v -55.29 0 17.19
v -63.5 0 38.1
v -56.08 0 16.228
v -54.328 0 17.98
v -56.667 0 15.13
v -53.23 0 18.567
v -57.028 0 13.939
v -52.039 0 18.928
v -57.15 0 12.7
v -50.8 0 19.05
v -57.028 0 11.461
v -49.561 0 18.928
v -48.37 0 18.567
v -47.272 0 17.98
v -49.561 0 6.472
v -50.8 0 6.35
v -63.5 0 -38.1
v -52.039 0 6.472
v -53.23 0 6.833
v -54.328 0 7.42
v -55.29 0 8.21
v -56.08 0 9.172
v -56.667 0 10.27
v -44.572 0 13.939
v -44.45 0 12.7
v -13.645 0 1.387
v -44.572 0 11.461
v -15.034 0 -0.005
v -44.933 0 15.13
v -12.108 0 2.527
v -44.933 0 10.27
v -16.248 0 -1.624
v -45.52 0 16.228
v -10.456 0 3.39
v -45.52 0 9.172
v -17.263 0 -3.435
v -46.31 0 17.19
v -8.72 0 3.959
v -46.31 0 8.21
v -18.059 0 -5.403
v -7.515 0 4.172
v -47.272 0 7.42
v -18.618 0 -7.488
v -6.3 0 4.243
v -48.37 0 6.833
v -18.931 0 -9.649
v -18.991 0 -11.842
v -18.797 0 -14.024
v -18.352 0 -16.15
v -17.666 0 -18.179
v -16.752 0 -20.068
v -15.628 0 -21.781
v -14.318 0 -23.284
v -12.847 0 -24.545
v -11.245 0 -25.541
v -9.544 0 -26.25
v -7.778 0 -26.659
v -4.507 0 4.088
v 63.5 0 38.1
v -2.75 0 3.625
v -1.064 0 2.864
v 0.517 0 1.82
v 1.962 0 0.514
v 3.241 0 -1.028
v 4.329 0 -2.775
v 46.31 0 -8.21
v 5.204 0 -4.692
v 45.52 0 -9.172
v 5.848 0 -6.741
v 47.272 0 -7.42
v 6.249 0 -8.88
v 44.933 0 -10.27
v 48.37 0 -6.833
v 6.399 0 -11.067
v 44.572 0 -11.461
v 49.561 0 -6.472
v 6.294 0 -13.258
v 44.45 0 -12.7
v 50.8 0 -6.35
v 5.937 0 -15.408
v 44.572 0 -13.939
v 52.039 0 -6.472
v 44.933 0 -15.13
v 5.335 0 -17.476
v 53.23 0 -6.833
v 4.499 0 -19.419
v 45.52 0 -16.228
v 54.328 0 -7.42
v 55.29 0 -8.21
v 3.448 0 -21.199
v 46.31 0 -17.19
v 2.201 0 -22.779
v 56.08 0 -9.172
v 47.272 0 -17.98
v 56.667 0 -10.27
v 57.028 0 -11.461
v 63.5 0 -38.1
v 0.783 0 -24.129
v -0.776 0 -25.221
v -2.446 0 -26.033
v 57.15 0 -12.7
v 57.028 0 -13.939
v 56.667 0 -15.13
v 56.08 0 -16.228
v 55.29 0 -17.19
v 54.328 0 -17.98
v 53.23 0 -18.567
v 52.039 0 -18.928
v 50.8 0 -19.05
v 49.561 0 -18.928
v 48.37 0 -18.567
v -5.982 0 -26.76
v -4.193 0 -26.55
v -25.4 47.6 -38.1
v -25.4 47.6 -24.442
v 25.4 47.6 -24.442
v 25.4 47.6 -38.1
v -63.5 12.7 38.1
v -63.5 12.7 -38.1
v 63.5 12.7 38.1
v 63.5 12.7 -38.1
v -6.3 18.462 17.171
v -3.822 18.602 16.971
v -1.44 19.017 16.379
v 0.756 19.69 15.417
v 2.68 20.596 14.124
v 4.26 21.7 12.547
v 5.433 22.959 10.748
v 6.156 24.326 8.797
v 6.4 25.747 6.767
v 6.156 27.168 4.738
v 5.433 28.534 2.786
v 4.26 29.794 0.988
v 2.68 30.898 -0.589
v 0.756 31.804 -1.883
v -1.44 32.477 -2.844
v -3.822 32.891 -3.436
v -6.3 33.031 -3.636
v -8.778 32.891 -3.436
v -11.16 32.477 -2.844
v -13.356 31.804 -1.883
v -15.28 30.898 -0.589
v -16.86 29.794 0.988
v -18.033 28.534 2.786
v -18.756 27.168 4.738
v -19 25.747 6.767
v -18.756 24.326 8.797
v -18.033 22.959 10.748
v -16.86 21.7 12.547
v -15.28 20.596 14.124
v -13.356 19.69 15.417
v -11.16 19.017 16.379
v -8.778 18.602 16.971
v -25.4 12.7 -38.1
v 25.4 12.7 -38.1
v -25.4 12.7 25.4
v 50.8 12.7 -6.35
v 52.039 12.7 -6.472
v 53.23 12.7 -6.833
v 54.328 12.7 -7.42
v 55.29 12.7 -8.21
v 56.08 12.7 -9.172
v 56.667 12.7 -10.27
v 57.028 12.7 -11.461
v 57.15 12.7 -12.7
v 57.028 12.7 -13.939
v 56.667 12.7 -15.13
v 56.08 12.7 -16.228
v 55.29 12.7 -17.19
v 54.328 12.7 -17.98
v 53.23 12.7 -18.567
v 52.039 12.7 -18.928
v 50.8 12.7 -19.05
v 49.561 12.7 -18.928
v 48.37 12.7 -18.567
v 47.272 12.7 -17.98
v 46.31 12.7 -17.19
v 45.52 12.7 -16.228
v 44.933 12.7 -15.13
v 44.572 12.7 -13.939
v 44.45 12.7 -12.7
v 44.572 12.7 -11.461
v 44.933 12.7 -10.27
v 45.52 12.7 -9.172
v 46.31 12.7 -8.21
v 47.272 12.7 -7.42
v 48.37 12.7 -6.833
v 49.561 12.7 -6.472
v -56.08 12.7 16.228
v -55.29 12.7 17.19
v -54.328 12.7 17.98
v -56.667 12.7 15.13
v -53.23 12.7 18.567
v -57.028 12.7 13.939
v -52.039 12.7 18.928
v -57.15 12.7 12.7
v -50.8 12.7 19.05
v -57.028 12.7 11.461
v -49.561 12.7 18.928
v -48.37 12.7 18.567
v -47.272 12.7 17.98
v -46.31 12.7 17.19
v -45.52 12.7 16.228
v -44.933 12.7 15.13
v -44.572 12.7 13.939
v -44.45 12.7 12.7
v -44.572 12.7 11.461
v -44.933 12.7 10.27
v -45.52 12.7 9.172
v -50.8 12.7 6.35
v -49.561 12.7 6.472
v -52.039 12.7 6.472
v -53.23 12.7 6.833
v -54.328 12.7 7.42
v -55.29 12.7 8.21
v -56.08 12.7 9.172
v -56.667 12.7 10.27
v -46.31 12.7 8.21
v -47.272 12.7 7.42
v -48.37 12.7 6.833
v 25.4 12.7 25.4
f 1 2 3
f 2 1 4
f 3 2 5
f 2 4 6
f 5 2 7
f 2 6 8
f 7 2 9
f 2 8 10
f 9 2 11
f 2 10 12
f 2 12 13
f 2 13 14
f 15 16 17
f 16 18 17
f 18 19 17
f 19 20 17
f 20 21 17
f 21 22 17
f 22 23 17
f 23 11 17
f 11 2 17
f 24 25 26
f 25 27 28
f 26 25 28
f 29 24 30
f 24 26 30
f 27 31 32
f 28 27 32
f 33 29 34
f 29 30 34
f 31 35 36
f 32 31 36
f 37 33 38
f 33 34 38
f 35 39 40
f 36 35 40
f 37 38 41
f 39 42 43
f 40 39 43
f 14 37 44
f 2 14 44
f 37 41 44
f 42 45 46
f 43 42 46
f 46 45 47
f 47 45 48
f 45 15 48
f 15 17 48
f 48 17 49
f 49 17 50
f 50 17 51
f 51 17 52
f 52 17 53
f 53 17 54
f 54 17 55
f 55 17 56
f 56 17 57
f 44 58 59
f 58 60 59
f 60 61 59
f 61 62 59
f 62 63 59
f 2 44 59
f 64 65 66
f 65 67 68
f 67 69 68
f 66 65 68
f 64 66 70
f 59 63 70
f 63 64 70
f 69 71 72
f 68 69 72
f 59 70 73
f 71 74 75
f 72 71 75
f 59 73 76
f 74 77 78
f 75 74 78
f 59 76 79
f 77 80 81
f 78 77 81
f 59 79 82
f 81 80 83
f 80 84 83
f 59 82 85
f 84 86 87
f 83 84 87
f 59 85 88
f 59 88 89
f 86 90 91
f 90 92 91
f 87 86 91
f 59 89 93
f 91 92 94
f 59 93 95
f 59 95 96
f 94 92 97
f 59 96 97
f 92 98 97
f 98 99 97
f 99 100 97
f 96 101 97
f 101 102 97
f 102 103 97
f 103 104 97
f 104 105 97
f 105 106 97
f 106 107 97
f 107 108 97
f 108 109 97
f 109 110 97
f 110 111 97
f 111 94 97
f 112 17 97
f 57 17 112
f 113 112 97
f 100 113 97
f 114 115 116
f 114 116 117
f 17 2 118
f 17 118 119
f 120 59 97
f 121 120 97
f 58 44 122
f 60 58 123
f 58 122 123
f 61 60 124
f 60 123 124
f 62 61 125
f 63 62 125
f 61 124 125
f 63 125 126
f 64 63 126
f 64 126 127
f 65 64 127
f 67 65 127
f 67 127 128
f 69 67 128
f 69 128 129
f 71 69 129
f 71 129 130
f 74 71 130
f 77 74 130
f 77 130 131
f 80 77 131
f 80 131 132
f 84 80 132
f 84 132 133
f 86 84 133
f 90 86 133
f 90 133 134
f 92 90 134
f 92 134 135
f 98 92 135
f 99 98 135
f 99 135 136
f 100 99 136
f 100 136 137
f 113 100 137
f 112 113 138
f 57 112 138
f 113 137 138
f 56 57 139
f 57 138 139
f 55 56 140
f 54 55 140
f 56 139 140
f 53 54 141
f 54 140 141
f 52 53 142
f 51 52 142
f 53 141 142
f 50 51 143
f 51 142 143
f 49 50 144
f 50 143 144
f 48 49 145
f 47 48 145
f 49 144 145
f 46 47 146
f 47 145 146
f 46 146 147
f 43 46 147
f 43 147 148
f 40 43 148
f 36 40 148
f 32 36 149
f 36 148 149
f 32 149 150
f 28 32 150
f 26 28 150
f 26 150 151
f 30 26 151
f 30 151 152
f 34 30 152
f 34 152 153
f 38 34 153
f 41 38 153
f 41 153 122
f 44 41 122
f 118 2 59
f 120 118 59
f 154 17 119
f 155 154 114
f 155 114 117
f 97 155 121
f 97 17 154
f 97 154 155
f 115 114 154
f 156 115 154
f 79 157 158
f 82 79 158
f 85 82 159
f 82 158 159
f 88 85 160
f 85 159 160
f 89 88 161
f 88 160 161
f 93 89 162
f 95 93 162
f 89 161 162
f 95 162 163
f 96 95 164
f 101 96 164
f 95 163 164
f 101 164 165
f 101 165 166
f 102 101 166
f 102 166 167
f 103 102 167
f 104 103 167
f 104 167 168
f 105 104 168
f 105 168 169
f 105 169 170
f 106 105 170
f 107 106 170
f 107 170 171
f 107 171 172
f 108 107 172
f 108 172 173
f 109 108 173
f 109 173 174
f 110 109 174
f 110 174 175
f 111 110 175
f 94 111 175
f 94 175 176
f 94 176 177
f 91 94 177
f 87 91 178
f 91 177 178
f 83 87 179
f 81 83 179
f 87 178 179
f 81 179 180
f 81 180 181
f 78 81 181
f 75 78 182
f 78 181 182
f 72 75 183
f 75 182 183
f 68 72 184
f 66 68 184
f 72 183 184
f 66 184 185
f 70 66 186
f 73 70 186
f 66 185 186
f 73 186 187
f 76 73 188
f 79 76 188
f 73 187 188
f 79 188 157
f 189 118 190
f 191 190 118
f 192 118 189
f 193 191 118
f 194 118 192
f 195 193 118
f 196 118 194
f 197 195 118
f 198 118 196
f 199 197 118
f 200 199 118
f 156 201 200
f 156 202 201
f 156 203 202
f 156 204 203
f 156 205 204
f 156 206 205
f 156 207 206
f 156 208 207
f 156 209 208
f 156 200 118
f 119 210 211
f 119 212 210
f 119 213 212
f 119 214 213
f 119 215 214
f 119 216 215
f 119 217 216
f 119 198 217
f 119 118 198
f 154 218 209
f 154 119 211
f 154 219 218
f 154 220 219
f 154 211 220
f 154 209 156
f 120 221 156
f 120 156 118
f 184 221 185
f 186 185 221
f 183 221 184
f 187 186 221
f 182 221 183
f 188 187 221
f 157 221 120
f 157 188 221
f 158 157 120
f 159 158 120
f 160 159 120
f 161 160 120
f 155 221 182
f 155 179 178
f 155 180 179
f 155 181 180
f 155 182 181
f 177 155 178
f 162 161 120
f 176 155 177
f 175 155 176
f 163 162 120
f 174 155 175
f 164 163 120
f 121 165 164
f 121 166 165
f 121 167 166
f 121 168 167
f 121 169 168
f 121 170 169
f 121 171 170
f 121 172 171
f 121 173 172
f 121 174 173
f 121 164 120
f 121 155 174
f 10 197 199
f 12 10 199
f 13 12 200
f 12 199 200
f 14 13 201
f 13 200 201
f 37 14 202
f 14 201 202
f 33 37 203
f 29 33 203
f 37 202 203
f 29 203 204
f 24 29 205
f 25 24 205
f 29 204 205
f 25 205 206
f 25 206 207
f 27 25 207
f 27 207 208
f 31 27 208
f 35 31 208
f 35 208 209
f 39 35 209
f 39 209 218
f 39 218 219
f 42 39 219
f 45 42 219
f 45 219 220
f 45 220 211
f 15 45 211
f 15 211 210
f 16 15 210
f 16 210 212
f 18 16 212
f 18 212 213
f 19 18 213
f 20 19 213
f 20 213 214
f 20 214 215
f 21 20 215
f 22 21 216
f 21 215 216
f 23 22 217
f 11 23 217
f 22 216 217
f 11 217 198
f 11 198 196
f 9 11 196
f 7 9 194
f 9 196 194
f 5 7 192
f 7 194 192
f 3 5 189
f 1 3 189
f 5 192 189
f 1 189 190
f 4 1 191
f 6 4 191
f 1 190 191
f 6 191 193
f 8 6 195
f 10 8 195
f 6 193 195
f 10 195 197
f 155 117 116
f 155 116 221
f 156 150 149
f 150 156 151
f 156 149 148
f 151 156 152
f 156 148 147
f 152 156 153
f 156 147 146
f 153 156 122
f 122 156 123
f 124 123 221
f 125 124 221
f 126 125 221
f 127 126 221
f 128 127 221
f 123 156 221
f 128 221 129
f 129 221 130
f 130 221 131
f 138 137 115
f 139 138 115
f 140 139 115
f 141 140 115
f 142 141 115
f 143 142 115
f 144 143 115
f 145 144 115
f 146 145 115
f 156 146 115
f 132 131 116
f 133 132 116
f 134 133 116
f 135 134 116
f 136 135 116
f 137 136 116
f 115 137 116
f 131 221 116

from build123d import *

# Parameters (mm, degrees)
SKETCH1_W           = 127
SKETCH1_H           = 76.2
BASE_EXTRUDE_DEPTH  = 12.7
BOSS_EXTRUDE2_DEPTH = 25.4
SKETCH4_R           = 6.35
CUT_EXTRUDE1_DEPTH  = 143.275747443
SKETCH5_R           = 12.7
CUT_EXTRUDE2_DEPTH  = 87.702150572


with BuildPart() as part:
    # Sketch1 → Base-Extrude (new body)
    with BuildSketch(Plane(origin=(0, 0, 0), x_dir=(1, 0, 0), z_dir=(0, 1, 0))):
        Rectangle(SKETCH1_W, SKETCH1_H)
    extrude(amount=BASE_EXTRUDE_DEPTH)

    # Sketch3 → Boss-Extrude2 (add, symmetric)
    with BuildSketch(Plane(origin=(0, 0, 0), x_dir=(0, 0, -1), z_dir=(1, 0, 0))):
        Polygon((-25.4, 12.7), (24.442365435, 47.6), (38.1, 47.6), (38.1, 12.7), align=None)
    extrude(amount=BOSS_EXTRUDE2_DEPTH, both=True)

    # Sketch4 → Cut-Extrude1 (cut, through all)
    with BuildSketch(Plane(origin=(65.699574279, 12.7, 10.189215324), x_dir=(-1, 0, 0), z_dir=(0, 1, 0))):
        with Locations(Location((14.899574279, -22.889215324, 0), (0, 0, 90))):
            Circle(SKETCH4_R)
        with Locations(Location((116.499574279, 2.510784676, 0), (0, 0, 90))):
            Circle(SKETCH4_R)
    extrude(amount=-CUT_EXTRUDE1_DEPTH, mode=Mode.SUBTRACT)

    # Sketch5 → Cut-Extrude2 (cut, through all)
    with BuildSketch(Plane(origin=(0, 20.455924194, 14.323392322), x_dir=(-1, 0, 0), z_dir=(0, 0.8191520442889948, 0.5735764363510417))):
        with Locations(Location((6.3, -9.224251984, 0), (0, 0, 90))):
            Circle(SKETCH5_R)
    extrude(amount=-CUT_EXTRUDE2_DEPTH, mode=Mode.SUBTRACT)


solid = part.part
